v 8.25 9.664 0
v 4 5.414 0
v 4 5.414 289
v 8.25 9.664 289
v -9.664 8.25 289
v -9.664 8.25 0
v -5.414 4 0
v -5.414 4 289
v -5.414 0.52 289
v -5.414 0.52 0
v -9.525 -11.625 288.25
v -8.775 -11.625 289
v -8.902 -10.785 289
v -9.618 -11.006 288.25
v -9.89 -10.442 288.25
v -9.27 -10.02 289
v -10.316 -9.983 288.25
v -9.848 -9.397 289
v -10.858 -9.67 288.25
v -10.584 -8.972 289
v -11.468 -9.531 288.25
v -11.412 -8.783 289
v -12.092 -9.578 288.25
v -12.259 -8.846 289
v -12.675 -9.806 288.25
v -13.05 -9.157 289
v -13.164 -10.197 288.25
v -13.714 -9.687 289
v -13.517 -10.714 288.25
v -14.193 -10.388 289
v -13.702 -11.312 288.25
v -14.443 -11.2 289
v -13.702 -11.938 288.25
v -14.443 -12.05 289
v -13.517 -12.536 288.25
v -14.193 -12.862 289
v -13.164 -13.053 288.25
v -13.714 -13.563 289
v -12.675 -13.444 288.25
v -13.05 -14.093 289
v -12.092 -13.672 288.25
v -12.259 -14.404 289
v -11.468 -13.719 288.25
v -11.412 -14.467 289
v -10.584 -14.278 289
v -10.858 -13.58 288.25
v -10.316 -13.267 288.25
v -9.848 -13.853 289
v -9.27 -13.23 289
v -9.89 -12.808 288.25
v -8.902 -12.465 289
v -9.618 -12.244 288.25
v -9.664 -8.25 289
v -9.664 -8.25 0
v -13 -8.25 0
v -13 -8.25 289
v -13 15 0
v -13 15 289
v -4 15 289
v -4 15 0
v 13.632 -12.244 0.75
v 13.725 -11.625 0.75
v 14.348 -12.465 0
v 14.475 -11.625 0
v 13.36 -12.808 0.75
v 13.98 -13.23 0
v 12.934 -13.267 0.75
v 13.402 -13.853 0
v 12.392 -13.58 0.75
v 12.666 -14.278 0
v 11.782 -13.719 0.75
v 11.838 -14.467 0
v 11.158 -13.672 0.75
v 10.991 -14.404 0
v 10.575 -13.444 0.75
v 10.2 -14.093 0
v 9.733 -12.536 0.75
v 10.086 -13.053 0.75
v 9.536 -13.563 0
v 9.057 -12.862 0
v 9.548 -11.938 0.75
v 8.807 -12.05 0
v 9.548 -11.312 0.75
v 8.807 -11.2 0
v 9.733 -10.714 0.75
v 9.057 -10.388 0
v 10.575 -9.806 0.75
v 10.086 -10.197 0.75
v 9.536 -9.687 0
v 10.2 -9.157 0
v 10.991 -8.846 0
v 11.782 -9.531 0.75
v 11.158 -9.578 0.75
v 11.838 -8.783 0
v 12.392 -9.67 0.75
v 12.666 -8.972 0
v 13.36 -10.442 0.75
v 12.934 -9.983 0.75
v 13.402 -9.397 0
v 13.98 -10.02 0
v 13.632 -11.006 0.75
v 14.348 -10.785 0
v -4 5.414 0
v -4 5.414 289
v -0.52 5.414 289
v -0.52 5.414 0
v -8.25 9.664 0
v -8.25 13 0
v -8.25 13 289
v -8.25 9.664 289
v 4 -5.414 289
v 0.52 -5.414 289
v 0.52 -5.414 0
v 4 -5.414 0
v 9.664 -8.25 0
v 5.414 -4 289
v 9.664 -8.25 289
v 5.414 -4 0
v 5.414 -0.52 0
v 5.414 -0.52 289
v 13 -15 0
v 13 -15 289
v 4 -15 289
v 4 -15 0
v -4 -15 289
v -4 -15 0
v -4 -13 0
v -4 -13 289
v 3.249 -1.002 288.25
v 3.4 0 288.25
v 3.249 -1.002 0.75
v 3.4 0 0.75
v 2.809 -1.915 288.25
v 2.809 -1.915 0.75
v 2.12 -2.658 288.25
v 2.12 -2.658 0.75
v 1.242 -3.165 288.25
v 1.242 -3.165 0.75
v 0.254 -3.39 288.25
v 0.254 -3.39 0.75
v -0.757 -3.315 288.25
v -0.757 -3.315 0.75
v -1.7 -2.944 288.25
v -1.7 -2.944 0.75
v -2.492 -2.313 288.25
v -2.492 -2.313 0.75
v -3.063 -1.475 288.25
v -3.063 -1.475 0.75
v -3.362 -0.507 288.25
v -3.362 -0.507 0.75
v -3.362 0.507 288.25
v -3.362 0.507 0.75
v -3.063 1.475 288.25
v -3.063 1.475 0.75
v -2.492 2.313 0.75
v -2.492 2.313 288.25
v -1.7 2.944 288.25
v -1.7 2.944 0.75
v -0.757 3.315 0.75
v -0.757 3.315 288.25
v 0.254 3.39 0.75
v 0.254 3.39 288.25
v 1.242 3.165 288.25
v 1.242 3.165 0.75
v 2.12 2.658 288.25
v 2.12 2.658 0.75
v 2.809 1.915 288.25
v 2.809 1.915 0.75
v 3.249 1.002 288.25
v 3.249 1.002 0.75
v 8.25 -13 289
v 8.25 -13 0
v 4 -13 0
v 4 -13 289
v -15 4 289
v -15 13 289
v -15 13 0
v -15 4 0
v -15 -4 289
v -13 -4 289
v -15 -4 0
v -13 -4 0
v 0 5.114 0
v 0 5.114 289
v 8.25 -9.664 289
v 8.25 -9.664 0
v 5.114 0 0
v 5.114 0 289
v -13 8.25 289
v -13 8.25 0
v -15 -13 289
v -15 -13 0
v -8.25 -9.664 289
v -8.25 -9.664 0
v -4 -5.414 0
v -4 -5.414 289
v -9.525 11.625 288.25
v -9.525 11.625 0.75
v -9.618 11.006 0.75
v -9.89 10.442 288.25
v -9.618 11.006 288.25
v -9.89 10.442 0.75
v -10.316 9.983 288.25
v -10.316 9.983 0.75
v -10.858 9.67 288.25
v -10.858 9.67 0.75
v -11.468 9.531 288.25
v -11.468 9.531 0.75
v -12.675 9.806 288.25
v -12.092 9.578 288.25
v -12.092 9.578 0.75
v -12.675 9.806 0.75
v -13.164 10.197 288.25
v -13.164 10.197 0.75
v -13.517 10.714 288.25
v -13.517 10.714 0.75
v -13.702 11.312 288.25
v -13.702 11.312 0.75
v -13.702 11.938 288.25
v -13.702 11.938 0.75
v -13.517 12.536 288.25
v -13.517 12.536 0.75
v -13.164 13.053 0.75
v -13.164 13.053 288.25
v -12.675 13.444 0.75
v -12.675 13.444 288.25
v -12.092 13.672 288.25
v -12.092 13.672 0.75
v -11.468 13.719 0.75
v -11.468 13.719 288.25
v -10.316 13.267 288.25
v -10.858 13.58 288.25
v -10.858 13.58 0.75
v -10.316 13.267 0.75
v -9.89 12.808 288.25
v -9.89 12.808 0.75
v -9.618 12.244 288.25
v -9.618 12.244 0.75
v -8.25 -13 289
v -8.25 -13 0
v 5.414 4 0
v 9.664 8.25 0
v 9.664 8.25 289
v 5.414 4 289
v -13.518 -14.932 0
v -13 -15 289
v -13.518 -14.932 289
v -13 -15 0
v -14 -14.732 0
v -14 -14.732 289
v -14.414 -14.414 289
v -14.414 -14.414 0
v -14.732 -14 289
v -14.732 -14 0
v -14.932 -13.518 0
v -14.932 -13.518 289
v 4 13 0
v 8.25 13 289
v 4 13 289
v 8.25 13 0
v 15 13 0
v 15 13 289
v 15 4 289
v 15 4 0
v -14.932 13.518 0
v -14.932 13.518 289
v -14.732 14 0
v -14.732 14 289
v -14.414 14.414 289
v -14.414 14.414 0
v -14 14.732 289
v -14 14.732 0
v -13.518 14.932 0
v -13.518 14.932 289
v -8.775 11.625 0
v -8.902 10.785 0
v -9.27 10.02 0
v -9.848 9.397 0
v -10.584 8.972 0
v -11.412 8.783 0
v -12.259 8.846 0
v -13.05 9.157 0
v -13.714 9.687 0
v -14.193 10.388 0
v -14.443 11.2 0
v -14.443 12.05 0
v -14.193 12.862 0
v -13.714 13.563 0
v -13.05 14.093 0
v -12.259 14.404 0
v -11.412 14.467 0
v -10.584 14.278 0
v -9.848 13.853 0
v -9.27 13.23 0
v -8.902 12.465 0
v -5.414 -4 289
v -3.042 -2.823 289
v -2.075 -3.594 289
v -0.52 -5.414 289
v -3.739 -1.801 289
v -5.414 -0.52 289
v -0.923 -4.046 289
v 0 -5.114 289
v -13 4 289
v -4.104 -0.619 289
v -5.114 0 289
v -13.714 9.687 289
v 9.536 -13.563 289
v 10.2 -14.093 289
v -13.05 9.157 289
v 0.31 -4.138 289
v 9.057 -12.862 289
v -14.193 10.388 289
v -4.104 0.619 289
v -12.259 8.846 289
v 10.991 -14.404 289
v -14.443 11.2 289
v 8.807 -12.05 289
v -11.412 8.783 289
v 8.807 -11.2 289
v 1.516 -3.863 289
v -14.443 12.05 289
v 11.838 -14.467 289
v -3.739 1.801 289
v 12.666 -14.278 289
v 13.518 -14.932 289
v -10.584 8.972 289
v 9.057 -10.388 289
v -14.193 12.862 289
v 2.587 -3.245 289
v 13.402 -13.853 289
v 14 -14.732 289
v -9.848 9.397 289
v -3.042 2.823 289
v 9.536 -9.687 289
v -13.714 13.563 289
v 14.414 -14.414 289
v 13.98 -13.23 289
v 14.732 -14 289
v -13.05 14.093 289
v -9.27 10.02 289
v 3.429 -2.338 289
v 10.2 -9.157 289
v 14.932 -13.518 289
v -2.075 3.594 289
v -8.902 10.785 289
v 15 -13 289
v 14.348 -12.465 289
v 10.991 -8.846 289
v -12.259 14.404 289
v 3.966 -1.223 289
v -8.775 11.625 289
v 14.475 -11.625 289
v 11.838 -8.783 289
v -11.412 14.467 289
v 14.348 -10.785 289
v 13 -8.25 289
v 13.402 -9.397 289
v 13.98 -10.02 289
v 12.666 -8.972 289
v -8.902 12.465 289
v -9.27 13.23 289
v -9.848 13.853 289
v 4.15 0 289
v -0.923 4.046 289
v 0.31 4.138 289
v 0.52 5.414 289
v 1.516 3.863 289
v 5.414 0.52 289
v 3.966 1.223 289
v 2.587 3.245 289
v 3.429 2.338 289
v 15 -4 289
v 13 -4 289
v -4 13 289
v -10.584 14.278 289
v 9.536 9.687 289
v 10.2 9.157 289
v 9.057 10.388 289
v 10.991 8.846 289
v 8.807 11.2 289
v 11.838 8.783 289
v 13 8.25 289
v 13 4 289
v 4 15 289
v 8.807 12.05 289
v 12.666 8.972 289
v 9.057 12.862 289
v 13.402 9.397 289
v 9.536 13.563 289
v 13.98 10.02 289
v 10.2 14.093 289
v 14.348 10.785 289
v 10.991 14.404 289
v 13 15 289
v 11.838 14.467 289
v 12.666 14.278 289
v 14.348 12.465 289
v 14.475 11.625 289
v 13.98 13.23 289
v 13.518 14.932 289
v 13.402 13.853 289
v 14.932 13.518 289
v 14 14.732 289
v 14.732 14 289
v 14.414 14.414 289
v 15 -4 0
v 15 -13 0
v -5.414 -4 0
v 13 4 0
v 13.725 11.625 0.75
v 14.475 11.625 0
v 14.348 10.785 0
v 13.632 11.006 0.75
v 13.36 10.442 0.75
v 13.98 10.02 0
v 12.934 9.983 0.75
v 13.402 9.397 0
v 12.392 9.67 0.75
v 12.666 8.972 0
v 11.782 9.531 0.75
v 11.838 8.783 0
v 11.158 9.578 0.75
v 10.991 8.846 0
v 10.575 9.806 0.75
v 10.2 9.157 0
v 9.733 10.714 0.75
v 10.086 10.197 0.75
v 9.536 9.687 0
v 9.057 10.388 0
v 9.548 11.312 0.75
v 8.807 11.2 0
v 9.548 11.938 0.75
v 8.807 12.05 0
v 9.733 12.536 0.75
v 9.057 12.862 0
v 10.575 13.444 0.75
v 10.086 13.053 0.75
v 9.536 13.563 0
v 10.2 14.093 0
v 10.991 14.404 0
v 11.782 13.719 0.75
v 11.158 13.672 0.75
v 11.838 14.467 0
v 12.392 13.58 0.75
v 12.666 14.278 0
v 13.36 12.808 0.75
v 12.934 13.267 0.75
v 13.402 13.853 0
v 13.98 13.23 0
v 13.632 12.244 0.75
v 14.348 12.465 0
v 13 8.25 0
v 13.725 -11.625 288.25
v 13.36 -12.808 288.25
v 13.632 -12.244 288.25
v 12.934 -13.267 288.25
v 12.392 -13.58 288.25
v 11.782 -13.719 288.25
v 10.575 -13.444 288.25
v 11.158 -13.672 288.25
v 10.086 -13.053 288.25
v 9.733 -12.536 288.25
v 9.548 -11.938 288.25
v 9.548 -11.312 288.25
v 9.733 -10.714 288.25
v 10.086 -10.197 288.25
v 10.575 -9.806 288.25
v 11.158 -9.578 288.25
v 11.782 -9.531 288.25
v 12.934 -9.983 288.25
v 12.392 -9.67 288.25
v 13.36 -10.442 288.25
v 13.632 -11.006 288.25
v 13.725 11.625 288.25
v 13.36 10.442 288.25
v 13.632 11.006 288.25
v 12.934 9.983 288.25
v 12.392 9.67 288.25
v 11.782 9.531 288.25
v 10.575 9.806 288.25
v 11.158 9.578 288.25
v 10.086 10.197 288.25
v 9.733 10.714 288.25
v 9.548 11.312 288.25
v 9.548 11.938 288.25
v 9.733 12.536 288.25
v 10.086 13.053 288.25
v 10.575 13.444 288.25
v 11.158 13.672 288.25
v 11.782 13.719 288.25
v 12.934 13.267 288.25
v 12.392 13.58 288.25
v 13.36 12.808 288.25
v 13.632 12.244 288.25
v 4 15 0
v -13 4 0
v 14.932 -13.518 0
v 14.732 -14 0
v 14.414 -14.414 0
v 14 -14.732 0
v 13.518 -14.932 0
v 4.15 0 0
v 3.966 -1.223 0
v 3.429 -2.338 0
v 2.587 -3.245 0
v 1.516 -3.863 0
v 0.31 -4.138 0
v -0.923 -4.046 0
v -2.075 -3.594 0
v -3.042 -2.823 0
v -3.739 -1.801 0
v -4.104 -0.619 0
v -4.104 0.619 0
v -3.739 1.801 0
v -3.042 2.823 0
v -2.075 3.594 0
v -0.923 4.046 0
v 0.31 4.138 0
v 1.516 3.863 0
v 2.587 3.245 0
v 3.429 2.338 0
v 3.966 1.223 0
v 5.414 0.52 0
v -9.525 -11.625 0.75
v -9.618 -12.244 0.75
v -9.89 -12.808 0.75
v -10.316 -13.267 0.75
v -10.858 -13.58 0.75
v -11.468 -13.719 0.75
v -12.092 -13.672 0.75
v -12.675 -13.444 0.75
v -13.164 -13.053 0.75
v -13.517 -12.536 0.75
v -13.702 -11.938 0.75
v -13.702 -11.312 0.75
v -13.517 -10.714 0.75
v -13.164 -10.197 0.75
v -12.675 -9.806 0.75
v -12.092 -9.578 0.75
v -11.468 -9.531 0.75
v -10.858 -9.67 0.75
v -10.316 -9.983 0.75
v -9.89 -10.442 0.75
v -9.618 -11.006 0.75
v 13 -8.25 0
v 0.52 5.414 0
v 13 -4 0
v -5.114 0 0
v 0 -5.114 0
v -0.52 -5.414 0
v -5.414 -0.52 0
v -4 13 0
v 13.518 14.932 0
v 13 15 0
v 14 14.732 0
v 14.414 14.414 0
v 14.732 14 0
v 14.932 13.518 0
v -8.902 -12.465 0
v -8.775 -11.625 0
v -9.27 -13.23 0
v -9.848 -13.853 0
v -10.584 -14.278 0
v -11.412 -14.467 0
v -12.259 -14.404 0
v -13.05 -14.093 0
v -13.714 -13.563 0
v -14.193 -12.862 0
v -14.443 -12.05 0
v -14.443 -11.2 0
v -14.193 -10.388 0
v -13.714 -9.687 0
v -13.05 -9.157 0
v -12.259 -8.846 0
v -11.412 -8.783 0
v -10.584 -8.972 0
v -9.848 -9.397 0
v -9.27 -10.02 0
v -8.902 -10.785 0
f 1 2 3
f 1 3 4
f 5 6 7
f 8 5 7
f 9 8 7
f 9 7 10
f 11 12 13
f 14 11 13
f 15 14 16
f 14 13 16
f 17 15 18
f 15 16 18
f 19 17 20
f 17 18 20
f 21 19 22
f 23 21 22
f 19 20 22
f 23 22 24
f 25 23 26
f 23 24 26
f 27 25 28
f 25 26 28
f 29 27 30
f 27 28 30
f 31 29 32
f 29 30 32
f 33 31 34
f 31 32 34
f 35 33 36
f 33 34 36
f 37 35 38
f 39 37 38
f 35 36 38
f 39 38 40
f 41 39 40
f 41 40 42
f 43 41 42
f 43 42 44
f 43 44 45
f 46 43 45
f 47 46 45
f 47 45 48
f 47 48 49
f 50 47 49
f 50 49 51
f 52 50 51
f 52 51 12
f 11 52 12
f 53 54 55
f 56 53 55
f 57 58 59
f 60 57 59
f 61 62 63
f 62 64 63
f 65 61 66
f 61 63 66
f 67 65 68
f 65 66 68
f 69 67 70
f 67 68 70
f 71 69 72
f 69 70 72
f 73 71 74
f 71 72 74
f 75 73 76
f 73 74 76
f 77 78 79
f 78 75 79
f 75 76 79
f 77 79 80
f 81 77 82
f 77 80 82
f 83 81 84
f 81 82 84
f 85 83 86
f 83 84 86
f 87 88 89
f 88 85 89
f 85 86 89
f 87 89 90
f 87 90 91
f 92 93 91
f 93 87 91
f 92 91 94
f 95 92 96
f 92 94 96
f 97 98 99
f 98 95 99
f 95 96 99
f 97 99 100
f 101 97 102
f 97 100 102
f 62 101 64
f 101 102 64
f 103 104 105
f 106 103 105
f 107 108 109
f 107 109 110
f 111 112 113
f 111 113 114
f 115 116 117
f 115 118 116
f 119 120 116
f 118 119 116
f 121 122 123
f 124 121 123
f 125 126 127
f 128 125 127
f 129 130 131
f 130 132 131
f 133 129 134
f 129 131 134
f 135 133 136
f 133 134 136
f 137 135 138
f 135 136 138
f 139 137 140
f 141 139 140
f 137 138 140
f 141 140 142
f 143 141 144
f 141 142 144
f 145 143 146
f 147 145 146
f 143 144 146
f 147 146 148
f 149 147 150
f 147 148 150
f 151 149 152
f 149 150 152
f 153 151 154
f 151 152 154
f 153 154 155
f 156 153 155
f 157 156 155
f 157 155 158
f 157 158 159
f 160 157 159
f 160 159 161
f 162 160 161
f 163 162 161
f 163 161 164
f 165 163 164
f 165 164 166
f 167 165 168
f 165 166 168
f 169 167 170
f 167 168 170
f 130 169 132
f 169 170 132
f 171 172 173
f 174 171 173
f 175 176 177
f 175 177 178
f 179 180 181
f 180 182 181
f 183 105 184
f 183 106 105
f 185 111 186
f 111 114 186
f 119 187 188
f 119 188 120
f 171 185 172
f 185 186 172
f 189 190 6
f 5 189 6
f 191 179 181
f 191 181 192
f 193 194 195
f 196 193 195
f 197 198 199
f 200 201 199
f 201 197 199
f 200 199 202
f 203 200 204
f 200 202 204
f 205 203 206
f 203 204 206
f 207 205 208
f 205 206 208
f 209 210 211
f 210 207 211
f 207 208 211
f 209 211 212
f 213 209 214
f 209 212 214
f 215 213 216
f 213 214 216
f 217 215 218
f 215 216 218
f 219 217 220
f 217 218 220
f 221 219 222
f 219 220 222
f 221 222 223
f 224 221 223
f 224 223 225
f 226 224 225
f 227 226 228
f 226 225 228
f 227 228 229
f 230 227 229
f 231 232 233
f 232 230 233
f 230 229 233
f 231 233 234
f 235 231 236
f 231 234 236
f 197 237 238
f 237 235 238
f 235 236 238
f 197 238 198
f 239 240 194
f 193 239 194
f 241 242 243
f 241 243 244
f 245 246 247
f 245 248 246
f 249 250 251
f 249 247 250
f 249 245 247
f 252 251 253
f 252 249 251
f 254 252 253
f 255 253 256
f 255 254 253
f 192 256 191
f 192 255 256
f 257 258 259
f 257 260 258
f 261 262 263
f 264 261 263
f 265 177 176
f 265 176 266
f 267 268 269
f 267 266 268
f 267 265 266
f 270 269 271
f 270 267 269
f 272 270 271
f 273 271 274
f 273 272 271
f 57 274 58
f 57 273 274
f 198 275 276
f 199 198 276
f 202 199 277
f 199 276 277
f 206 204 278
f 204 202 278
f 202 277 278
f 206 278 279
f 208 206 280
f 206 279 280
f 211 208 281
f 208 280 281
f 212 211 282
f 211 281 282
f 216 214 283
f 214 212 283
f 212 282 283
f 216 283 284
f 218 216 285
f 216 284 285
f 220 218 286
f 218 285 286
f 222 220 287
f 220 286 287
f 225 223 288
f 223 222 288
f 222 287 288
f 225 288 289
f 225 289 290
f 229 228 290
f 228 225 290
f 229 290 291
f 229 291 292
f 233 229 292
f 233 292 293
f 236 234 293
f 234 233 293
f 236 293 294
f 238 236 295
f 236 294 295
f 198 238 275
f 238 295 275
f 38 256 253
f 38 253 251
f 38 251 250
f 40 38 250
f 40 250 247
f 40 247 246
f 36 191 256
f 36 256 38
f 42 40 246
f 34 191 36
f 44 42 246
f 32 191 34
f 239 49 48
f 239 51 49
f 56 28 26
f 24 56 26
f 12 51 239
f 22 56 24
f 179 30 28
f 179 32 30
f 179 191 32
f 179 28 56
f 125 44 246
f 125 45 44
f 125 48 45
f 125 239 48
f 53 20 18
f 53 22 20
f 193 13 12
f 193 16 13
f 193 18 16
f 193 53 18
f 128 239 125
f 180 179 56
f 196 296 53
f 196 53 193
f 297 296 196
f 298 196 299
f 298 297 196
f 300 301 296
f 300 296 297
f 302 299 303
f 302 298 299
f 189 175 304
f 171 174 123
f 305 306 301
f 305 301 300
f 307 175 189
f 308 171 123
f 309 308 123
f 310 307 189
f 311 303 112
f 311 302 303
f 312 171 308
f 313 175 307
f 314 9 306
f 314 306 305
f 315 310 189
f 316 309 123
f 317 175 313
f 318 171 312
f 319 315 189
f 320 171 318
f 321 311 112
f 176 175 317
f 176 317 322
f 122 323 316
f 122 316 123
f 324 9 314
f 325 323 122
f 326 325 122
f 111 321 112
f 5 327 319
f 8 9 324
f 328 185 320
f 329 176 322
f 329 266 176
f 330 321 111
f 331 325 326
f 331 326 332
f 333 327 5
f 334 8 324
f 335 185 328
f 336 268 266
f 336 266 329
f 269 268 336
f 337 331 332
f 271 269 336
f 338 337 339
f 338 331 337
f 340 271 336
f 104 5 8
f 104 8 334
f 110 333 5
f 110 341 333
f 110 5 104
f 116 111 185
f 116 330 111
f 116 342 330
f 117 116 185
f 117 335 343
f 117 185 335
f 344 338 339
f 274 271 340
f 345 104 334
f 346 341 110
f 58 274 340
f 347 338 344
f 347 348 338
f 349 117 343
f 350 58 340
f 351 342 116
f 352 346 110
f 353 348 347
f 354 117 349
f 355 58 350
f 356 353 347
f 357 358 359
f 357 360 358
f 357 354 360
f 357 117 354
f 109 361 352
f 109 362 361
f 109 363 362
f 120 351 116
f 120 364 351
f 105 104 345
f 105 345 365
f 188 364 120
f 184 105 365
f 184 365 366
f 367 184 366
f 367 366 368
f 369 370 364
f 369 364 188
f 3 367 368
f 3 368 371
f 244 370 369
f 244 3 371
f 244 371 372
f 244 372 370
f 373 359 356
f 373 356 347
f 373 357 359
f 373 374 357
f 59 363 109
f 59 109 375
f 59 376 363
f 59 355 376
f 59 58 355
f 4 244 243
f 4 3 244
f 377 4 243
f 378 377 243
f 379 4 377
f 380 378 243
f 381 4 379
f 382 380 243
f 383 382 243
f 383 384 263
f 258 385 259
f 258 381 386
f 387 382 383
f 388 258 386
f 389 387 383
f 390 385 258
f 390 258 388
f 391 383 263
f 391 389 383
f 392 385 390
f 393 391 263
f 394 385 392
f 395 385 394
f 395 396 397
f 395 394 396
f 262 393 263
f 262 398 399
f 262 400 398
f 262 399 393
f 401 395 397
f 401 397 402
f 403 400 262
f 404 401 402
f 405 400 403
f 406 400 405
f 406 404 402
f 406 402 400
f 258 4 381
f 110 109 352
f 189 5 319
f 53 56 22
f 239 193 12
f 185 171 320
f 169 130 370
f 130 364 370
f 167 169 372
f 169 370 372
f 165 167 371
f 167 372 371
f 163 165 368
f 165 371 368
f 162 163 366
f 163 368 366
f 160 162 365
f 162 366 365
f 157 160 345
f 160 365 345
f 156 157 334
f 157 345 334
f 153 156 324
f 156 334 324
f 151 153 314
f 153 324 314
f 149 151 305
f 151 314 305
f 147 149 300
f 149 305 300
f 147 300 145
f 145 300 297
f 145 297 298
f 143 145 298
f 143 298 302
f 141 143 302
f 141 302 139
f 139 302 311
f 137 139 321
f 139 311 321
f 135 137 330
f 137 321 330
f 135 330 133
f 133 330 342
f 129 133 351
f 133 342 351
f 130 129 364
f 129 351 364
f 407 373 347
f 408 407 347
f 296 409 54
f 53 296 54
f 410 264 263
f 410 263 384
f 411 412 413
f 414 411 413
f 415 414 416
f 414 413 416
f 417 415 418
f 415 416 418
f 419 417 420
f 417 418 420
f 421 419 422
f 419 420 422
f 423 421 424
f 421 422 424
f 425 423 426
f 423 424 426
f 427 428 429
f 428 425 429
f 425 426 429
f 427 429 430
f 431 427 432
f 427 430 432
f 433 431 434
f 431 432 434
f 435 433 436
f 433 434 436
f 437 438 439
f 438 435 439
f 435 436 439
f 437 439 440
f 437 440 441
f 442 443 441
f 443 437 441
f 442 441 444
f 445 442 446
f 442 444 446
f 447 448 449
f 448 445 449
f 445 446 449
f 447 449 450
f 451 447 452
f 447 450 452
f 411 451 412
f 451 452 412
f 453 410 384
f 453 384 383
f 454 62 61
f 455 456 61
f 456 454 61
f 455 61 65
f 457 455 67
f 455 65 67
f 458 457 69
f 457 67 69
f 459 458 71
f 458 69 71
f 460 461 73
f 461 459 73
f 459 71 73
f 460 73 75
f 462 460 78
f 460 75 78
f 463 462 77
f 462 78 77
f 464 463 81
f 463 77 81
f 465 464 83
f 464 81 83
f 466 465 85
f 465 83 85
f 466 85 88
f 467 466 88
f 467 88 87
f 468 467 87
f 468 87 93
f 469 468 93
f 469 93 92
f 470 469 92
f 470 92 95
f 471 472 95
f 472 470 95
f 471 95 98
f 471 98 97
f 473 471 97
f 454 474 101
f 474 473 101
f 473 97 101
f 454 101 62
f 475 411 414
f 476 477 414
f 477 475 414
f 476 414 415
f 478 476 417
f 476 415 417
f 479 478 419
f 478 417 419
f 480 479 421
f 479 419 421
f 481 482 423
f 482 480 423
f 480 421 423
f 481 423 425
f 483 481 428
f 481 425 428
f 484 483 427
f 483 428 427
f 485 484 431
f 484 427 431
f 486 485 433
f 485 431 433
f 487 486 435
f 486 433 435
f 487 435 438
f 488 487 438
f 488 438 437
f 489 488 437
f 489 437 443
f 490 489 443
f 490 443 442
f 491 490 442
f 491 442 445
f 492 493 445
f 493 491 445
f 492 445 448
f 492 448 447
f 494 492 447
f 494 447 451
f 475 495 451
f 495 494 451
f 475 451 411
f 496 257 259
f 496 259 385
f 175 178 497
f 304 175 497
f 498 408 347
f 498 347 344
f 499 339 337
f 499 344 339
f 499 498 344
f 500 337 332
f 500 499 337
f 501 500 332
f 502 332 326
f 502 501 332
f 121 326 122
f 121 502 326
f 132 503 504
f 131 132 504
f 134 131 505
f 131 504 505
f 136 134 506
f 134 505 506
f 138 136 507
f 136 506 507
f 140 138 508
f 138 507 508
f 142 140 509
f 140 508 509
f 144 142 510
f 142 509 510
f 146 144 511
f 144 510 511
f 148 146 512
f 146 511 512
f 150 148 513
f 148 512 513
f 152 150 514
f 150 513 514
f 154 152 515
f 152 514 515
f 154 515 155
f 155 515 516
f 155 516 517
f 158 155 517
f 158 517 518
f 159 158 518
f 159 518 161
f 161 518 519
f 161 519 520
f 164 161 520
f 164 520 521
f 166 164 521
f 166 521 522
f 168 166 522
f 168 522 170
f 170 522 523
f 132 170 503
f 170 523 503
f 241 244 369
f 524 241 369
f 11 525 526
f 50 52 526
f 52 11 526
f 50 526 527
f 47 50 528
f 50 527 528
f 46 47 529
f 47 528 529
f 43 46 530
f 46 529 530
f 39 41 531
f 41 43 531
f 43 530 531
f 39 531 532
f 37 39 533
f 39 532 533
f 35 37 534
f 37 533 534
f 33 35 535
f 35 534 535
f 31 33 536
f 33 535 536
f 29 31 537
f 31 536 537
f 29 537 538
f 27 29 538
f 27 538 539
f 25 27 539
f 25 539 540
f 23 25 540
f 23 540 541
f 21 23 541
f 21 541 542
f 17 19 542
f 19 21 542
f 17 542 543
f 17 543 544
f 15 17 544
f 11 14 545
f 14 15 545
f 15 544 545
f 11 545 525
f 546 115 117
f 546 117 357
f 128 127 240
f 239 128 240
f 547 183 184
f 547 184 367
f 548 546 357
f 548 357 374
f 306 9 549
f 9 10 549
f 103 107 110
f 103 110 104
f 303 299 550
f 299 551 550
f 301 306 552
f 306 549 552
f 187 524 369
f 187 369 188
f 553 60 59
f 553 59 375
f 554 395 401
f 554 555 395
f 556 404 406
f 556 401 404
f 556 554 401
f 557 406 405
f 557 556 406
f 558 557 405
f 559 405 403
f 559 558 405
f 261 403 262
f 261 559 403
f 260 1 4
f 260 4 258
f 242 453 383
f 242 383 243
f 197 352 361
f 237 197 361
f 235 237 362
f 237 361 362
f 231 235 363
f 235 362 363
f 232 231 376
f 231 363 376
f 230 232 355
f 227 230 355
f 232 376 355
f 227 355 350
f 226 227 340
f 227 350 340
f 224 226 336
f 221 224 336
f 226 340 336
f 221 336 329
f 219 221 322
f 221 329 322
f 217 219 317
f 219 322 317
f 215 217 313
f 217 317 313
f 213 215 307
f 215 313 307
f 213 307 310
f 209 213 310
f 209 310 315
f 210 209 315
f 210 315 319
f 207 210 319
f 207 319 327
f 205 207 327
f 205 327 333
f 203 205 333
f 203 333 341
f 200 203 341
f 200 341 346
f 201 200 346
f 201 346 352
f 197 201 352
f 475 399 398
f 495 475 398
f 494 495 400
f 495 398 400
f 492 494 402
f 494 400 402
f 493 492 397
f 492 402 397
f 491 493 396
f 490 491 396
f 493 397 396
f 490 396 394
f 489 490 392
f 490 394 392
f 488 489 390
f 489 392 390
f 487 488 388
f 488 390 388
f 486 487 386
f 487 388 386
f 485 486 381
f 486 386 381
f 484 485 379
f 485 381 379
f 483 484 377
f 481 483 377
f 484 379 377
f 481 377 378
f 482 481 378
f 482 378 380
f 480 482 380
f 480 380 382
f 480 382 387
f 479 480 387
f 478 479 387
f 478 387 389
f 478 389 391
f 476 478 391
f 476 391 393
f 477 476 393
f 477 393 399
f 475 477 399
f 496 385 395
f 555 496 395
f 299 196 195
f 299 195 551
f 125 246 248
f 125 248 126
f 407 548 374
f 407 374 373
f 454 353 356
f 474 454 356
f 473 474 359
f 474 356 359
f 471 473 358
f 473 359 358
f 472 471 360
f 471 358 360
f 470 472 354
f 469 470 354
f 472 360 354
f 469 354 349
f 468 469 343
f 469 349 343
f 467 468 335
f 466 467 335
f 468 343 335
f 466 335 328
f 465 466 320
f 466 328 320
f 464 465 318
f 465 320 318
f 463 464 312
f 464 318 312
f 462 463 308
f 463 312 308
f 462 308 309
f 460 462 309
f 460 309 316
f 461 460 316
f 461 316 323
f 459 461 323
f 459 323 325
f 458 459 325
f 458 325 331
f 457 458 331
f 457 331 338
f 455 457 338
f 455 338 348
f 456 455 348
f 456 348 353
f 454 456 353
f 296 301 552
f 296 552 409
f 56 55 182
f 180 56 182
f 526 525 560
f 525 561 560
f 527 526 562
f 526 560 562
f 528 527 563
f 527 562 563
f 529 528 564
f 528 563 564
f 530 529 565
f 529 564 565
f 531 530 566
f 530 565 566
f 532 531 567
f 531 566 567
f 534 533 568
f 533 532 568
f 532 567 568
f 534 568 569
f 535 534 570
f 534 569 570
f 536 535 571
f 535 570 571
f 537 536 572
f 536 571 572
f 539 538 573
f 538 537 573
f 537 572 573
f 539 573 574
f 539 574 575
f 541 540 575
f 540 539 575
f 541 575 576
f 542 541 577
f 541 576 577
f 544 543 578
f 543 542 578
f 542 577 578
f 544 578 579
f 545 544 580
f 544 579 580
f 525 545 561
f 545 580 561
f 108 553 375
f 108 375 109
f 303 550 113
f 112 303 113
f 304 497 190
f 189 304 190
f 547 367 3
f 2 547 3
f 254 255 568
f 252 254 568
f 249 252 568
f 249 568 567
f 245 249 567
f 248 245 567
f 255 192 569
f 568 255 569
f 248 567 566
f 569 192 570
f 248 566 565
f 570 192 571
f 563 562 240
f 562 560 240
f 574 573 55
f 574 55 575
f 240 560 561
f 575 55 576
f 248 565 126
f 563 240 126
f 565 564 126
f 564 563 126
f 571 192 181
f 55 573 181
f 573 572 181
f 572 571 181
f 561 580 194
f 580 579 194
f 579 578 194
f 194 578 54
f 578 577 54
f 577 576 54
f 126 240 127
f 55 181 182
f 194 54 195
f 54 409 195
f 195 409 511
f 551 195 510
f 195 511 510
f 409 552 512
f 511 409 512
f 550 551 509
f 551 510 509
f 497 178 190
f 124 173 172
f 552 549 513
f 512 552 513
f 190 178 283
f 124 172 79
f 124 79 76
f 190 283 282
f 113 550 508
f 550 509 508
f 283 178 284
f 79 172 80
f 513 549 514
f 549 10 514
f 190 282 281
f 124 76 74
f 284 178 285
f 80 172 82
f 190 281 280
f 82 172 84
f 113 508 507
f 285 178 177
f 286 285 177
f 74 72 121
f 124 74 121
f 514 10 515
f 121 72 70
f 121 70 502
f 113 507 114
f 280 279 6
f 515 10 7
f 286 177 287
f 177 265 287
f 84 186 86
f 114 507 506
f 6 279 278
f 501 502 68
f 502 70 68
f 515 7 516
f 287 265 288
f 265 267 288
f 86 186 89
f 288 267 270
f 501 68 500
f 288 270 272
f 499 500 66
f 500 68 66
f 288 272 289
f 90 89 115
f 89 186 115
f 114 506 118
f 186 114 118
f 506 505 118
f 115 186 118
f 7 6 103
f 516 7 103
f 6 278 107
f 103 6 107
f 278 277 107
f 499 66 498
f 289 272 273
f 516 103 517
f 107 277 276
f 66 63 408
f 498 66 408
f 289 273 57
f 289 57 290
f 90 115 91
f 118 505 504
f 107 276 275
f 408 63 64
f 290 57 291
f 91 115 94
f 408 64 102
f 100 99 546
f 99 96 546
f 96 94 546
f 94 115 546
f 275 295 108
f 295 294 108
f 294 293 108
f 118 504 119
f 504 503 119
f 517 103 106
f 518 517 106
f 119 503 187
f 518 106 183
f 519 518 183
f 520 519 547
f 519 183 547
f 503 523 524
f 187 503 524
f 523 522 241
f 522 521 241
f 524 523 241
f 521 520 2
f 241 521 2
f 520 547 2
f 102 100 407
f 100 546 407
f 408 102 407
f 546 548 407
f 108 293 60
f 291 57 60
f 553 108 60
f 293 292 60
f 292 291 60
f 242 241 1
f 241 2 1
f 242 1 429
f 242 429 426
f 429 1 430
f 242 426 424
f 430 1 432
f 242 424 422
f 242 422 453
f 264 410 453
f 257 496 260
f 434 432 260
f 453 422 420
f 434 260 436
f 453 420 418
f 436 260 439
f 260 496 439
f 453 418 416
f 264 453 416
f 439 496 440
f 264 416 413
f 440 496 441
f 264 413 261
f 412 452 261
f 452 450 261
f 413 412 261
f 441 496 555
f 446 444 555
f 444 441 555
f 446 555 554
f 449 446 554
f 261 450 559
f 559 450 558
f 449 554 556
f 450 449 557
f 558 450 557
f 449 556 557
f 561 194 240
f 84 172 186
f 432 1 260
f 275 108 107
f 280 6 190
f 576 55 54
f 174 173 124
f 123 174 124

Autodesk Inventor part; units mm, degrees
ref_plane "YZ Plane" through (0, 0, 0) normal (1, 0, 0) x (0, 1, 0)
ref_plane "XZ Plane" through (0, 0, 0) normal (0, 1, 0) x (-1, 0, 0)
ref_plane "XY Plane" through (0, 0, 0) normal (0, 0, 1) x (1, 0, 0)
sketch "Náčrt1" plane through (0, 0, 0) normal (0, 0, 1) x (1, 0, 0)
  line L0 (0, -21.5799) -> (0, 21.5799) projected
  line L1 (-21.5799, 0) -> (21.5799, 0) projected
  line L2 (-13, 15) -> (-4, 15)
  line L3 (-4, 15) -> (-4, 13)
  line L4 (-4, 13) -> (-8.25, 13)
  line L5 (-8.25, 13) -> (-8.25, 9.6642)
  line L6 (-8.25, 9.6642) -> (-4, 5.4142)
  line L7 (-4, 5.4142) -> (-0.5196, 5.4142)
  line L8 (-0.5196, 5.4142) -> (0, 5.1142)
  line L9 (0, 5.1142) -> (0.5196, 5.4142)
  line L10 (0.5196, 5.4142) -> (4, 5.4142)
  line L11 (4, 5.4142) -> (8.25, 9.6642)
  line L12 (8.25, 9.6642) -> (8.25, 13)
  line L13 (8.25, 13) -> (4, 13)
  line L14 (4, 13) -> (4, 15)
  line L15 (4, 15) -> (13, 15)
  line L16 (15, 13) -> (15, 4)
  line L17 (15, 4) -> (13, 4)
  line L18 (13, 4) -> (13, 8.25)
  line L19 (13, 8.25) -> (9.6642, 8.25)
  line L20 (9.6642, 8.25) -> (5.4142, 4)
  line L21 (5.4142, 4) -> (5.4142, 0.5196)
  line L22 (5.4142, 0.5196) -> (5.1142, 0)
  line L23 (5.1142, 0) -> (5.4142, -0.5196)
  line L24 (5.4142, -0.5196) -> (5.4142, -4)
  line L25 (5.4142, -4) -> (9.6642, -8.25)
  line L26 (9.6642, -8.25) -> (13, -8.25)
  line L27 (13, -8.25) -> (13, -4)
  line L28 (13, -4) -> (15, -4)
  line L29 (15, -4) -> (15, -13)
  line L30 (13, -15) -> (4, -15)
  line L31 (-15, 13) -> (-15, 4)
  line L32 (-15, 4) -> (-13, 4)
  line L33 (-13, 4) -> (-13, 8.25)
  line L34 (-13, 8.25) -> (-9.6642, 8.25)
  line L35 (-9.6642, 8.25) -> (-5.4142, 4)
  line L36 (-5.4142, 4) -> (-5.4142, 0.5196)
  line L37 (-5.4142, 0.5196) -> (-5.1142, 0)
  line L38 (-5.1142, 0) -> (-5.4142, -0.5196)
  line L39 (-5.4142, -0.5196) -> (-5.4142, -4)
  line L40 (-5.4142, -4) -> (-9.6642, -8.25)
  line L41 (-9.6642, -8.25) -> (-13, -8.25)
  line L42 (-13, -8.25) -> (-13, -4)
  line L43 (-13, -4) -> (-15, -4)
  line L44 (-15, -4) -> (-15, -13)
  line L45 (-13, -15) -> (-4, -15)
  line L46 (-4, -15) -> (-4, -13)
  line L47 (-8.25, -9.6642) -> (-4, -5.4142)
  line L48 (-4, -5.4142) -> (-0.5196, -5.4142)
  line L49 (-0.5196, -5.4142) -> (0, -5.1142)
  line L50 (0, -5.1142) -> (0.5196, -5.4142)
  line L51 (0.5196, -5.4142) -> (4, -5.4142)
  line L52 (4, -5.4142) -> (8.25, -9.6642)
  line L53 (8.25, -9.6642) -> (8.25, -13)
  line L54 (8.25, -13) -> (4, -13)
  line L55 (4, -13) -> (4, -15)
  line L56 (-4, -13) -> (-8.25, -13)
  line L57 (-8.25, -13) -> (-8.25, -9.6642)
  circle A0 centre (-11.625, 11.625) radius 2.1
  circle A1 centre (11.625, 11.625) radius 2.1
  circle A2 centre (11.625, -11.625) radius 2.1
  circle A3 centre (-11.625, -11.625) radius 2.1
  circle A4 centre (0, 0) radius 3.4
  arc A5 (-13, 15) -> (-15, 13) centre (-13, 13) ccw
  arc A6 (15, 13) -> (13, 15) centre (13, 13) ccw
  arc A7 (13, -15) -> (15, -13) centre (13, -13) ccw
  arc A8 (-15, -13) -> (-13, -15) centre (-13, -13) ccw
  line L58 (-5.1142, 0) -> (-3.4, 0)
  line L59 (0, -5.1142) -> (0, -3.4)
  line L60 (5.1142, 0) -> (3.4, 0)
  line L61 (0, 5.1142) -> (0, 3.4)
  point P0 (15, -15)
  dimension "d0" = 120
  dimension "d1" = 0.3
  dimension "d2" = 30
  dimension "d3" = 8
  dimension "d4" = 2
  dimension "d5" = 6.75
  dimension "d6" = 120
  dimension "d7" = 2
  dimension "d8" = 4.2
  dimension "d9" = 23.25
  dimension "d10" = 23.25
  dimension "d11" = 6.8
  dimension "d12" = 2
extrude "Vysunutí1" add sketch "Náčrt1" along normal blind 289 contours L49 L48 L47 L57 L56 L46 L45 A8 L44 L43 L42 L41 L40 L39 L38 L1 A4 L0 | L0 A4 L1 L23 L24 L25 L26 L27 L28 L29 A7 L30 L55 L54 L53 L52 L51 L50 | L1 L37 L36 L35 L34 L33 L32 L31 A5 L2 L3 L4 L5 L6 L7 L8 L0 A4 | A4 L0 L9 L10 L11 L12 L13 L14 L15 A6 L16 L17 L18 L19 L20 L21 L22 L1
thread "Závit1" size "M5x0.8" class "6H" standard "ANSI Metric M Profile" length 15
thread "Závit2" size "M4.5x0.75" class "6H" standard "ANSI Metric M Profile" length 15
thread "Závit3" size "M4.5x0.75" class "6H" standard "ANSI Metric M Profile" length 15
thread "Závit4" size "M4.5x0.75" class "6H" standard "ANSI Metric M Profile" length 15
chamfer "Zkosení1" distance 0.75 angle 45 4 edges at (9.525, 11.625, 0) (-13.725, -11.625, 0) (-13.725, -11.625, 289) (9.525, 11.625, 289)
thread "Závit5" size "M5x0.8" class "6H" standard "ANSI Metric M Profile" length 15
thread "Závit6" size "M4.5x0.75" class "6H" standard "ANSI Metric M Profile" length 15
thread "Závit7" size "M4.5x0.75" class "6H" standard "ANSI Metric M Profile" length 15
thread "Závit8" size "M4.5x0.75" class "6H" standard "ANSI Metric M Profile" length 15
chamfer "Zkosení2" distance 0.75 angle 45 4 edges at (-13.725, 11.625, 289) (9.525, -11.625, 289) (9.525, -11.625, 0) (-13.725, 11.625, 0)
chamfer "Zkosení3" distance 0.75 angle 45 2 edges at (0, -3.4, 289) (0, -3.4, 0)
equation "\"d6\" = d0"
equation "\"d7\" = d4"
